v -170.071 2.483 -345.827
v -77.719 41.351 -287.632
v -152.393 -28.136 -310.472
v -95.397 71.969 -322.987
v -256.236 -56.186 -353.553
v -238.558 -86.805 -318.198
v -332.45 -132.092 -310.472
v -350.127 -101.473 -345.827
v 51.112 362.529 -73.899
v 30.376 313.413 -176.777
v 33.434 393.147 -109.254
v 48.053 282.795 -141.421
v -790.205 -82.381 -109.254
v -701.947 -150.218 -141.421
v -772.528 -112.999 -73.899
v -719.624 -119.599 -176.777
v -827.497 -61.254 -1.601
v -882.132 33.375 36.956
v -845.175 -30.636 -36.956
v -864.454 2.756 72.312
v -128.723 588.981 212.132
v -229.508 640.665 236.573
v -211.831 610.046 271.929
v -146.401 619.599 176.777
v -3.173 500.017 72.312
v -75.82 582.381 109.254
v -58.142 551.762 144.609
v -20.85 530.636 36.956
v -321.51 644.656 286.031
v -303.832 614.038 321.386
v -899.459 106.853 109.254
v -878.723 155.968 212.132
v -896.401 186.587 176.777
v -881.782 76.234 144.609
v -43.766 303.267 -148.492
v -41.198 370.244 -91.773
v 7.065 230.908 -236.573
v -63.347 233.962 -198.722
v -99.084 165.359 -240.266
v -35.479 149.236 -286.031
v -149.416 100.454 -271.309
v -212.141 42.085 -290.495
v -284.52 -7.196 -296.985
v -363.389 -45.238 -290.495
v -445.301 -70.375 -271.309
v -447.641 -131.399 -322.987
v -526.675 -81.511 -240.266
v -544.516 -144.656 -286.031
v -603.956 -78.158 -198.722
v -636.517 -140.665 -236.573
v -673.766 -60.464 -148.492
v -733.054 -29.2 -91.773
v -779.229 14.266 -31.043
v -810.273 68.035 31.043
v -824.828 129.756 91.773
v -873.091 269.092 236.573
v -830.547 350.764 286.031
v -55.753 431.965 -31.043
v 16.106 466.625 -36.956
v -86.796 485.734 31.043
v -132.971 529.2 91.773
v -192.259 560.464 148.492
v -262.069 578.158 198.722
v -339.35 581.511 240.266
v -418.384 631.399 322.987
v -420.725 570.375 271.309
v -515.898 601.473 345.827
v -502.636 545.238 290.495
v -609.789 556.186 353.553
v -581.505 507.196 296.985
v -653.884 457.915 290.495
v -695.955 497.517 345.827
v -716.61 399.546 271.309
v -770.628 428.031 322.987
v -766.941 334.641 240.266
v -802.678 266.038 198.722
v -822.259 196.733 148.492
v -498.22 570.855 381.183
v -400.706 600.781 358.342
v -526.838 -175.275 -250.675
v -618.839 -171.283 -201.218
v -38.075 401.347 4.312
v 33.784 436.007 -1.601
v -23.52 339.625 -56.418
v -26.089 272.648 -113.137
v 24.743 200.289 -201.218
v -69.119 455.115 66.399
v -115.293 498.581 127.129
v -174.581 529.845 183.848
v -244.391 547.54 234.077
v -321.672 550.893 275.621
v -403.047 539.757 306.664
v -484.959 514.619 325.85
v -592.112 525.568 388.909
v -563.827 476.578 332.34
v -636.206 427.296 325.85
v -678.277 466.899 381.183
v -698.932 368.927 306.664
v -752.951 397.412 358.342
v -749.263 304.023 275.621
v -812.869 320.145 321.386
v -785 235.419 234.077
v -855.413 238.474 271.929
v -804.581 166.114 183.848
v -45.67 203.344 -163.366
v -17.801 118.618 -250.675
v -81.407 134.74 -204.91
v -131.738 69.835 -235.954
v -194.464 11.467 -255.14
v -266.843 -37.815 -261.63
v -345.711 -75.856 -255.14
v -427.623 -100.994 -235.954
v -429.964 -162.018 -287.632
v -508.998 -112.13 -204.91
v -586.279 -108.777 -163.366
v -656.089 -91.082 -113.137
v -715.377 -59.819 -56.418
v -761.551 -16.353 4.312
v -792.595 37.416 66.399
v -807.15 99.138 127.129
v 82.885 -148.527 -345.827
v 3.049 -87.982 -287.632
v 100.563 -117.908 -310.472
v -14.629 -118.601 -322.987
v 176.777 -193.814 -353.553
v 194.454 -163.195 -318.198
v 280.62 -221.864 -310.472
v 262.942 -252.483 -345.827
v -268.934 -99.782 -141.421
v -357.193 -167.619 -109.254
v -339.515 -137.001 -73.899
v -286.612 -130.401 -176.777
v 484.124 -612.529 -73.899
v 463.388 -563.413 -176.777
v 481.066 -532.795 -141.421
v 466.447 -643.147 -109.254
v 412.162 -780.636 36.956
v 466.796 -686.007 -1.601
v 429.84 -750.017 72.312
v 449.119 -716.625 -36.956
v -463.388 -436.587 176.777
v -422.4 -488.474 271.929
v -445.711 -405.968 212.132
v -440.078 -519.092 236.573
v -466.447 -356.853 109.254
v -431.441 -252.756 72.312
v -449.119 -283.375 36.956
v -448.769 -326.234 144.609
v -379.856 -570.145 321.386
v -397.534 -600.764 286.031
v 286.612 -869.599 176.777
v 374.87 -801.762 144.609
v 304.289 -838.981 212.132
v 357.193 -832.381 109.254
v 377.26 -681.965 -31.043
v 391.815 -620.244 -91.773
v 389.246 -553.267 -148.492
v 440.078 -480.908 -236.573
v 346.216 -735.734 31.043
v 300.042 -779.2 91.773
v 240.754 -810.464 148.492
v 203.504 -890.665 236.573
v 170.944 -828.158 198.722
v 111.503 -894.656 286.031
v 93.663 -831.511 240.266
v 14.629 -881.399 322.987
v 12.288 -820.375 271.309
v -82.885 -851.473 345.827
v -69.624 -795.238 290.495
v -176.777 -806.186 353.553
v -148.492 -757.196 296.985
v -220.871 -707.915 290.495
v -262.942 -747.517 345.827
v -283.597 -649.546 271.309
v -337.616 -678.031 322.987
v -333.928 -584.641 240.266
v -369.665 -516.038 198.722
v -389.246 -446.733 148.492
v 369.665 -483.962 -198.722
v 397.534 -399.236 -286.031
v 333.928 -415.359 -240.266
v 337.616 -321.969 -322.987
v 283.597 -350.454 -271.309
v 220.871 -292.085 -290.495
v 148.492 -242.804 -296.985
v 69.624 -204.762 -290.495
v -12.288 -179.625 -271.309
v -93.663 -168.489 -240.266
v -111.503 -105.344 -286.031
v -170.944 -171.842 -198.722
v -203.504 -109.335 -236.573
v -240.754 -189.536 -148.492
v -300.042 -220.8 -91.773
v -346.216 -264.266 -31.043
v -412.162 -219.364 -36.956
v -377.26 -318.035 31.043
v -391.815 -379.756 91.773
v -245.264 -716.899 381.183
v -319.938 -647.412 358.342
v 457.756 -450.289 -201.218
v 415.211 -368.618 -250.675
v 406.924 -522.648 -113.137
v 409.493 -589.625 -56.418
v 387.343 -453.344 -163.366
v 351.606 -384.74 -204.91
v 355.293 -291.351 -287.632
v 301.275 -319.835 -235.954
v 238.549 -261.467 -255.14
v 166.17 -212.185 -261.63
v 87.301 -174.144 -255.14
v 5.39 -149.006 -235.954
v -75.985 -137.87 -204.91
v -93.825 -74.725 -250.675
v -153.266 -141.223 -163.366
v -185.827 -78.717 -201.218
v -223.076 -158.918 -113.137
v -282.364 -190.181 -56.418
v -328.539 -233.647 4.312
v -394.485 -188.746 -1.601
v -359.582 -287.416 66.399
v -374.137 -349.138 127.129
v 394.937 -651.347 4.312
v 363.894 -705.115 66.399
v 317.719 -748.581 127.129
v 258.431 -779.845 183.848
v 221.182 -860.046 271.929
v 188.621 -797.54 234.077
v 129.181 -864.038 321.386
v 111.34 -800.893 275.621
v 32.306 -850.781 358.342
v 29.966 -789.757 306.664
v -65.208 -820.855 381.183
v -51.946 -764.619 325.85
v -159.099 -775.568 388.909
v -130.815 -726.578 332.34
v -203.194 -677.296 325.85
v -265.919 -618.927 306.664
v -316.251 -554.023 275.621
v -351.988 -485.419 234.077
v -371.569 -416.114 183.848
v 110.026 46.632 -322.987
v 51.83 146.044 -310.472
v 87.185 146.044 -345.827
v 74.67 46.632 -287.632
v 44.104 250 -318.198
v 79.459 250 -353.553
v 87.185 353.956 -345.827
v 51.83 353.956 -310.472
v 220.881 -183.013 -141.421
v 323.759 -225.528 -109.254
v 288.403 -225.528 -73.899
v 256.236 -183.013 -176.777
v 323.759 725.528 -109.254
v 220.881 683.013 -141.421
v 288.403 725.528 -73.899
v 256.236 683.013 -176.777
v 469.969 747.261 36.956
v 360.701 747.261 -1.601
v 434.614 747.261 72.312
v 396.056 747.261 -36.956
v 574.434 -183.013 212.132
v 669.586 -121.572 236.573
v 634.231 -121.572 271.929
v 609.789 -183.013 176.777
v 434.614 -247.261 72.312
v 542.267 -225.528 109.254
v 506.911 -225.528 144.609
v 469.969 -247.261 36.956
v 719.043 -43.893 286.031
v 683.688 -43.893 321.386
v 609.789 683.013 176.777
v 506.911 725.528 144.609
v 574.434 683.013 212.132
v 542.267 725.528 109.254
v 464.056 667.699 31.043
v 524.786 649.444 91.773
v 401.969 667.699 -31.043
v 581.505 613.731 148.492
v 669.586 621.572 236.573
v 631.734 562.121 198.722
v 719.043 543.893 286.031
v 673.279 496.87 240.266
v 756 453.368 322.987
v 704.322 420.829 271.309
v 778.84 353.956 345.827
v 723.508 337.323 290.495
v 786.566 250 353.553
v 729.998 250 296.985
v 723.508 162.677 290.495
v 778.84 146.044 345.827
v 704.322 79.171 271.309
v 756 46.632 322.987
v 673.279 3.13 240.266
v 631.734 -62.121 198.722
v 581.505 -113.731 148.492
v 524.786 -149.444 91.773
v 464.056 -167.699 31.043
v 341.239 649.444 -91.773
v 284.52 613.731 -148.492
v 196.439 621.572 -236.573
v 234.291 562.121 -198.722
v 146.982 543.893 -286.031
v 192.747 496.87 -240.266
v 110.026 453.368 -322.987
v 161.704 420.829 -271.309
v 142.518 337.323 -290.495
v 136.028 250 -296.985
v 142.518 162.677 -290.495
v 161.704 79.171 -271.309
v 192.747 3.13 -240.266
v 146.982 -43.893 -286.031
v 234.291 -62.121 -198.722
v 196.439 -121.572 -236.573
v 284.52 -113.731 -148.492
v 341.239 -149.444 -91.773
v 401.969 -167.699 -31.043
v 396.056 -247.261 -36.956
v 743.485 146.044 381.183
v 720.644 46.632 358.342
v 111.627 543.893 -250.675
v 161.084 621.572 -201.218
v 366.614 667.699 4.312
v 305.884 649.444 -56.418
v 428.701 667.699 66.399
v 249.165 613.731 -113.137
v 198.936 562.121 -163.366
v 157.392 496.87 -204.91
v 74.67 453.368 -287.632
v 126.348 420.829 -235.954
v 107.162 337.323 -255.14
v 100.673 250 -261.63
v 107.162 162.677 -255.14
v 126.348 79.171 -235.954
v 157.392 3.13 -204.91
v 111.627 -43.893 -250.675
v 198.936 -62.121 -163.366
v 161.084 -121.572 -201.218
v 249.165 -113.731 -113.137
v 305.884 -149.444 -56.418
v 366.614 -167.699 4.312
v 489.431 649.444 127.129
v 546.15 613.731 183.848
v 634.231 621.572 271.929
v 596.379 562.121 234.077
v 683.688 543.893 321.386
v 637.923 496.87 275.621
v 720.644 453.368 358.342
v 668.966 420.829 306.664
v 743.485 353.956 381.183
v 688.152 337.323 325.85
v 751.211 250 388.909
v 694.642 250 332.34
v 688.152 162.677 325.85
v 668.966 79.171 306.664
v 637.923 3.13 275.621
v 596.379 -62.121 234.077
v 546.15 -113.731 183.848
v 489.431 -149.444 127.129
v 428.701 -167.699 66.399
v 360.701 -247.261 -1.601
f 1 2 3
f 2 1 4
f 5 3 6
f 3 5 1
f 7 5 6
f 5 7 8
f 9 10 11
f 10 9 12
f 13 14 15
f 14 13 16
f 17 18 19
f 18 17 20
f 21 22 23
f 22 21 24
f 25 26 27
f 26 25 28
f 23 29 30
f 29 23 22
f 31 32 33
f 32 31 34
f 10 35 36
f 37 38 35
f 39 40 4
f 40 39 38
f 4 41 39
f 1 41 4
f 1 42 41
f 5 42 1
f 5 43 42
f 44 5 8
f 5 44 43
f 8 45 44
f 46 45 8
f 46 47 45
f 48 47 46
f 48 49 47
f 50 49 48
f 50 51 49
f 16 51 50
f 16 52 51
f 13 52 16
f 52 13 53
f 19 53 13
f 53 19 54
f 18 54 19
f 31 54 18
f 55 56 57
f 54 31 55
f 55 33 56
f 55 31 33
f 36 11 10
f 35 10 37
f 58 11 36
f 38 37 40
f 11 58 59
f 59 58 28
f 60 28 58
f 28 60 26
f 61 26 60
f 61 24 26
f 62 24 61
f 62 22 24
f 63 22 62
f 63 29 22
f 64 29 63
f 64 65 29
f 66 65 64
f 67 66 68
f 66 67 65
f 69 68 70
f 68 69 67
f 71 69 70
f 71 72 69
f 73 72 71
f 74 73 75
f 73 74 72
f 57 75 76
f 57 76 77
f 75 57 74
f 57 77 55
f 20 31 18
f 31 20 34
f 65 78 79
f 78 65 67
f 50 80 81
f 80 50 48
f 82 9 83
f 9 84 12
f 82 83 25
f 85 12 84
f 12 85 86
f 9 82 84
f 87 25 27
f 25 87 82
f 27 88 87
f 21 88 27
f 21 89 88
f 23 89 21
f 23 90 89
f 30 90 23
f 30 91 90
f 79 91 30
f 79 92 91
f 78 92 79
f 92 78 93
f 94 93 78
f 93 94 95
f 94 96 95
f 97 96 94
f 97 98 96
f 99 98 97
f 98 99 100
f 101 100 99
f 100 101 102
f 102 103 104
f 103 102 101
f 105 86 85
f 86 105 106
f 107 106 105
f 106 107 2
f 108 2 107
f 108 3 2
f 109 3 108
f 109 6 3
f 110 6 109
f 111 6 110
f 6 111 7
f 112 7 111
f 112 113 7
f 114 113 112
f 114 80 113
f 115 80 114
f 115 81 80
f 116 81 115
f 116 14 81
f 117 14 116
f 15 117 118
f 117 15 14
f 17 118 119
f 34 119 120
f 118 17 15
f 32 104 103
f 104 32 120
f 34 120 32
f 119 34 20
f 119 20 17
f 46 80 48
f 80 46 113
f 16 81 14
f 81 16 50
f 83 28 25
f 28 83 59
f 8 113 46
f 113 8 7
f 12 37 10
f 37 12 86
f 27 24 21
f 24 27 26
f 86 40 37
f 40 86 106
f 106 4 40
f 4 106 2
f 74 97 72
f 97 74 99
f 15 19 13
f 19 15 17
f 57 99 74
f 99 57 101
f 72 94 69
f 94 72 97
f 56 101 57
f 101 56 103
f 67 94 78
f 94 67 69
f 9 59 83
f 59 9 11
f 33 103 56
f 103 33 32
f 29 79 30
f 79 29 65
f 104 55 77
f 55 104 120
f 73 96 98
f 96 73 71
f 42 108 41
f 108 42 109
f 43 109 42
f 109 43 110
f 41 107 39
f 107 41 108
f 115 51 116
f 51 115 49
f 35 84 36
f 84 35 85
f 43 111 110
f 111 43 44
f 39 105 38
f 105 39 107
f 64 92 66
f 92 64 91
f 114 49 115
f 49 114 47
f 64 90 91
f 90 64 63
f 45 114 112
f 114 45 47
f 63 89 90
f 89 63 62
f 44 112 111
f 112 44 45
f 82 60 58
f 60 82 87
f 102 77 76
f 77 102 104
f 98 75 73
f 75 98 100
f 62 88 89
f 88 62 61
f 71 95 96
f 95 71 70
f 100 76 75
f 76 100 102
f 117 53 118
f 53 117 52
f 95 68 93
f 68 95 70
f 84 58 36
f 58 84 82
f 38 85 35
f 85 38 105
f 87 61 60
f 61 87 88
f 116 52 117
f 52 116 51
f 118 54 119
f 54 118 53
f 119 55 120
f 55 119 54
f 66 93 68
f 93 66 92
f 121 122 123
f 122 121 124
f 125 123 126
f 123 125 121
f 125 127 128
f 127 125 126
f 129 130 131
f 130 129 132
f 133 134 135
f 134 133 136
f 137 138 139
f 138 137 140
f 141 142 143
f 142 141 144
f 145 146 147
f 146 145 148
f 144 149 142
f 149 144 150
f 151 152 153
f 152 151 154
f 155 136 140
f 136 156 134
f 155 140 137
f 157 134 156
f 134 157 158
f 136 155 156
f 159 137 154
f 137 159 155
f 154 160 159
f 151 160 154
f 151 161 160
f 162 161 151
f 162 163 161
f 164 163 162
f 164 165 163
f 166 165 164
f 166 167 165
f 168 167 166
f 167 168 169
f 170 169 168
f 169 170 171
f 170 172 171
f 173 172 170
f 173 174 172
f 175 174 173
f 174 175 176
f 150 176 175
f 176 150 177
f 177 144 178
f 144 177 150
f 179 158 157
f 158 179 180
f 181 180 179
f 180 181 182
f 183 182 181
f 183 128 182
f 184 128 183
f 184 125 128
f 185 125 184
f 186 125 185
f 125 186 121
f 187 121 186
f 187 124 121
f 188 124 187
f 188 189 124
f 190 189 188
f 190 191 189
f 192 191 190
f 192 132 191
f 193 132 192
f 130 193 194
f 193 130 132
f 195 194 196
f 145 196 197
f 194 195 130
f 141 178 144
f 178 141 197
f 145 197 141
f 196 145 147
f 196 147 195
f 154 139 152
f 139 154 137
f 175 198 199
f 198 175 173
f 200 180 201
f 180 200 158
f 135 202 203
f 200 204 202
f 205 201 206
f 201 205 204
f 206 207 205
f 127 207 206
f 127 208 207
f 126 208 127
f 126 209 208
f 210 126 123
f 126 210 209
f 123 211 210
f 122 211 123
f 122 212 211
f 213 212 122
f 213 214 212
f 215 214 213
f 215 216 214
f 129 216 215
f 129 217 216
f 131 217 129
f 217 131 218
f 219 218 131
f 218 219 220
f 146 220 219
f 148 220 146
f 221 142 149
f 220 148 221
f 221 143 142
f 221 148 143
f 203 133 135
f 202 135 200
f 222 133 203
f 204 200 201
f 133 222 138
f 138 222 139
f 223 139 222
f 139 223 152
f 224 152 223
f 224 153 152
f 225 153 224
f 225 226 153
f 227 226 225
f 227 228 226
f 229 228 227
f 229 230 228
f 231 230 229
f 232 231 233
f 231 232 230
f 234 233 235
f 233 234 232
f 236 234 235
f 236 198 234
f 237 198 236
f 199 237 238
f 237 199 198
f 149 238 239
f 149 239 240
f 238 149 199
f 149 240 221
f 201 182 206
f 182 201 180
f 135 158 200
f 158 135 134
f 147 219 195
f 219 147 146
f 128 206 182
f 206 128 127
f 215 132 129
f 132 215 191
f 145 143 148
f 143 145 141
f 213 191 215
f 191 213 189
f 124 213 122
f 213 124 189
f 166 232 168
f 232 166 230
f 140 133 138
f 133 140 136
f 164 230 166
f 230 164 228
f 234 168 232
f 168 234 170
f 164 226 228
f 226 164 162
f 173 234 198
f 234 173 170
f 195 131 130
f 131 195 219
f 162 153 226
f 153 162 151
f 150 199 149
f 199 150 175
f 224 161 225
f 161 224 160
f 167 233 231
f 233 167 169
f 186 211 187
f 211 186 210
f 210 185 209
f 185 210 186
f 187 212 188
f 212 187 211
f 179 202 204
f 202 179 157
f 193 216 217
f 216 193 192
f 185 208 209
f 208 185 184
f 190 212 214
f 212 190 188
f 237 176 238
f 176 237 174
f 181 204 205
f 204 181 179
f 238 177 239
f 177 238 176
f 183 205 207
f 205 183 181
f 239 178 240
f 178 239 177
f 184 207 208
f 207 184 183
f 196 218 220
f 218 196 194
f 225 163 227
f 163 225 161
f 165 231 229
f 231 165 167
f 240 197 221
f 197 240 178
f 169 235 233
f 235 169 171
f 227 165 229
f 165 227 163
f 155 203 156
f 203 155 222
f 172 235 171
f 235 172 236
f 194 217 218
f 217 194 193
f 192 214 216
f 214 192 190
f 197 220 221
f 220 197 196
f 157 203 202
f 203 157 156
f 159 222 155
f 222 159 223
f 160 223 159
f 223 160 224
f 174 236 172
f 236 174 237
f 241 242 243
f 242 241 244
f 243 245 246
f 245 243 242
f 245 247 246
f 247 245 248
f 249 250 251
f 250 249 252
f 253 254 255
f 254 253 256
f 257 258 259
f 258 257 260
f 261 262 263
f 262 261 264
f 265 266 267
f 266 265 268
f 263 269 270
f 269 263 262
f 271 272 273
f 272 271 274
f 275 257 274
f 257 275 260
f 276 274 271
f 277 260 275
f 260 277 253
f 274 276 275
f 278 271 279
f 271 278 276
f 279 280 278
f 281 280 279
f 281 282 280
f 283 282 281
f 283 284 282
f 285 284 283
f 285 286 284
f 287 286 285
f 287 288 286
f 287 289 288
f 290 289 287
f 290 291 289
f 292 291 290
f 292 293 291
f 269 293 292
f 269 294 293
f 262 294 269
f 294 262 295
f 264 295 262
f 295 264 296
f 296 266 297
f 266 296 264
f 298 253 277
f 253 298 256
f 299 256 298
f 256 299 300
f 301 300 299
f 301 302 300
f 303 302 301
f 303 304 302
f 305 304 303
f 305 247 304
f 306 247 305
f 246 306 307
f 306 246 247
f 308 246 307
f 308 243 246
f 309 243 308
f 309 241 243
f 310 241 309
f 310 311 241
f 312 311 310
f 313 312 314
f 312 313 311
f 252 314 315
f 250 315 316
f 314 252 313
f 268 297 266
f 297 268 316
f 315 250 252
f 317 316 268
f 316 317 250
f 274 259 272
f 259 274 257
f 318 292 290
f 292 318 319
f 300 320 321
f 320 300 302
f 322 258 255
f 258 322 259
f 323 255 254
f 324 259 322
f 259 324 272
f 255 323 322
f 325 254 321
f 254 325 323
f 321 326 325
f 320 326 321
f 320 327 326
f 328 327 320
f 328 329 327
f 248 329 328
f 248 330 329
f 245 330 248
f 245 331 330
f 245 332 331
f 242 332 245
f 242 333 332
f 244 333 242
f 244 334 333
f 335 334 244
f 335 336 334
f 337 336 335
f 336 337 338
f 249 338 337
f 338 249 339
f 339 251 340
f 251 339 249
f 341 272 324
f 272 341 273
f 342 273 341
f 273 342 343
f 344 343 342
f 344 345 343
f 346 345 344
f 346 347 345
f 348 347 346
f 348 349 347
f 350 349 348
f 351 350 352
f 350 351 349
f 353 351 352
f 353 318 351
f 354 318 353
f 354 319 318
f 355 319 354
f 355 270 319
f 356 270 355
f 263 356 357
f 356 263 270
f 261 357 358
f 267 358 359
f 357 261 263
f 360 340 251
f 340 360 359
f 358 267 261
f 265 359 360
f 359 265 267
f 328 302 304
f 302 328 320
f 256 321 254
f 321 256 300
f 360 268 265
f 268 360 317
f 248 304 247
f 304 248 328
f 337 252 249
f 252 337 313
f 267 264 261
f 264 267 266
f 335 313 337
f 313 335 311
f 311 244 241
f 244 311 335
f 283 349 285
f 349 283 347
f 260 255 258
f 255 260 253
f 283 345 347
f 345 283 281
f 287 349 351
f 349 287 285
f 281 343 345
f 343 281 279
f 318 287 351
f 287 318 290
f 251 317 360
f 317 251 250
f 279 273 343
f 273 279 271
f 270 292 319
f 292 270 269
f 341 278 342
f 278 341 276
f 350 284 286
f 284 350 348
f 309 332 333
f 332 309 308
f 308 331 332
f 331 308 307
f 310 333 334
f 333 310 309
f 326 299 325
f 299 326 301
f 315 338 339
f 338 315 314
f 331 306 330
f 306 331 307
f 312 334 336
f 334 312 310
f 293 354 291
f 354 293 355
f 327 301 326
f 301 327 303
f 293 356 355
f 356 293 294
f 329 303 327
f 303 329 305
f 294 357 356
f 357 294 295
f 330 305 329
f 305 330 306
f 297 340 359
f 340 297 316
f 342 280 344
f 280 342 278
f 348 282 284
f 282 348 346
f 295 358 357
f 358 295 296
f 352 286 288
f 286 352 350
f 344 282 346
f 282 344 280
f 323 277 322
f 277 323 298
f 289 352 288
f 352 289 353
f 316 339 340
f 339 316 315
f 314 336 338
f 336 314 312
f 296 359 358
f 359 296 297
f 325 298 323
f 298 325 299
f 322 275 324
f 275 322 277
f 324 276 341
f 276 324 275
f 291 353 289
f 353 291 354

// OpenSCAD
union() {
	rotate(a = 0, v = [0, 0, 1]) {
		translate(v = [0, 500, 0]) {
			rotate(a = -60, v = [0, 0, 1]) {
				translate(v = [0, -500, 0]) {
					rotate(a = 45, v = [0, 1, 0]) {
						difference() {
							cylinder(h = 50, r = 500);
							translate(v = [0, 0, -1]) {
								cylinder(h = 52, r = 420);
							}
						}
					}
				}
			}
		}
	}
	rotate(a = 120, v = [0, 0, 1]) {
		translate(v = [0, 500, 0]) {
			rotate(a = -60, v = [0, 0, 1]) {
				translate(v = [0, -500, 0]) {
					rotate(a = 45, v = [0, 1, 0]) {
						difference() {
							cylinder(h = 50, r = 500);
							translate(v = [0, 0, -1]) {
								cylinder(h = 52, r = 420);
							}
						}
					}
				}
			}
		}
	}
	rotate(a = 240, v = [0, 0, 1]) {
		translate(v = [0, 500, 0]) {
			rotate(a = -60, v = [0, 0, 1]) {
				translate(v = [0, -500, 0]) {
					rotate(a = 45, v = [0, 1, 0]) {
						difference() {
							cylinder(h = 50, r = 500);
							translate(v = [0, 0, -1]) {
								cylinder(h = 52, r = 420);
							}
						}
					}
				}
			}
		}
	}
}
